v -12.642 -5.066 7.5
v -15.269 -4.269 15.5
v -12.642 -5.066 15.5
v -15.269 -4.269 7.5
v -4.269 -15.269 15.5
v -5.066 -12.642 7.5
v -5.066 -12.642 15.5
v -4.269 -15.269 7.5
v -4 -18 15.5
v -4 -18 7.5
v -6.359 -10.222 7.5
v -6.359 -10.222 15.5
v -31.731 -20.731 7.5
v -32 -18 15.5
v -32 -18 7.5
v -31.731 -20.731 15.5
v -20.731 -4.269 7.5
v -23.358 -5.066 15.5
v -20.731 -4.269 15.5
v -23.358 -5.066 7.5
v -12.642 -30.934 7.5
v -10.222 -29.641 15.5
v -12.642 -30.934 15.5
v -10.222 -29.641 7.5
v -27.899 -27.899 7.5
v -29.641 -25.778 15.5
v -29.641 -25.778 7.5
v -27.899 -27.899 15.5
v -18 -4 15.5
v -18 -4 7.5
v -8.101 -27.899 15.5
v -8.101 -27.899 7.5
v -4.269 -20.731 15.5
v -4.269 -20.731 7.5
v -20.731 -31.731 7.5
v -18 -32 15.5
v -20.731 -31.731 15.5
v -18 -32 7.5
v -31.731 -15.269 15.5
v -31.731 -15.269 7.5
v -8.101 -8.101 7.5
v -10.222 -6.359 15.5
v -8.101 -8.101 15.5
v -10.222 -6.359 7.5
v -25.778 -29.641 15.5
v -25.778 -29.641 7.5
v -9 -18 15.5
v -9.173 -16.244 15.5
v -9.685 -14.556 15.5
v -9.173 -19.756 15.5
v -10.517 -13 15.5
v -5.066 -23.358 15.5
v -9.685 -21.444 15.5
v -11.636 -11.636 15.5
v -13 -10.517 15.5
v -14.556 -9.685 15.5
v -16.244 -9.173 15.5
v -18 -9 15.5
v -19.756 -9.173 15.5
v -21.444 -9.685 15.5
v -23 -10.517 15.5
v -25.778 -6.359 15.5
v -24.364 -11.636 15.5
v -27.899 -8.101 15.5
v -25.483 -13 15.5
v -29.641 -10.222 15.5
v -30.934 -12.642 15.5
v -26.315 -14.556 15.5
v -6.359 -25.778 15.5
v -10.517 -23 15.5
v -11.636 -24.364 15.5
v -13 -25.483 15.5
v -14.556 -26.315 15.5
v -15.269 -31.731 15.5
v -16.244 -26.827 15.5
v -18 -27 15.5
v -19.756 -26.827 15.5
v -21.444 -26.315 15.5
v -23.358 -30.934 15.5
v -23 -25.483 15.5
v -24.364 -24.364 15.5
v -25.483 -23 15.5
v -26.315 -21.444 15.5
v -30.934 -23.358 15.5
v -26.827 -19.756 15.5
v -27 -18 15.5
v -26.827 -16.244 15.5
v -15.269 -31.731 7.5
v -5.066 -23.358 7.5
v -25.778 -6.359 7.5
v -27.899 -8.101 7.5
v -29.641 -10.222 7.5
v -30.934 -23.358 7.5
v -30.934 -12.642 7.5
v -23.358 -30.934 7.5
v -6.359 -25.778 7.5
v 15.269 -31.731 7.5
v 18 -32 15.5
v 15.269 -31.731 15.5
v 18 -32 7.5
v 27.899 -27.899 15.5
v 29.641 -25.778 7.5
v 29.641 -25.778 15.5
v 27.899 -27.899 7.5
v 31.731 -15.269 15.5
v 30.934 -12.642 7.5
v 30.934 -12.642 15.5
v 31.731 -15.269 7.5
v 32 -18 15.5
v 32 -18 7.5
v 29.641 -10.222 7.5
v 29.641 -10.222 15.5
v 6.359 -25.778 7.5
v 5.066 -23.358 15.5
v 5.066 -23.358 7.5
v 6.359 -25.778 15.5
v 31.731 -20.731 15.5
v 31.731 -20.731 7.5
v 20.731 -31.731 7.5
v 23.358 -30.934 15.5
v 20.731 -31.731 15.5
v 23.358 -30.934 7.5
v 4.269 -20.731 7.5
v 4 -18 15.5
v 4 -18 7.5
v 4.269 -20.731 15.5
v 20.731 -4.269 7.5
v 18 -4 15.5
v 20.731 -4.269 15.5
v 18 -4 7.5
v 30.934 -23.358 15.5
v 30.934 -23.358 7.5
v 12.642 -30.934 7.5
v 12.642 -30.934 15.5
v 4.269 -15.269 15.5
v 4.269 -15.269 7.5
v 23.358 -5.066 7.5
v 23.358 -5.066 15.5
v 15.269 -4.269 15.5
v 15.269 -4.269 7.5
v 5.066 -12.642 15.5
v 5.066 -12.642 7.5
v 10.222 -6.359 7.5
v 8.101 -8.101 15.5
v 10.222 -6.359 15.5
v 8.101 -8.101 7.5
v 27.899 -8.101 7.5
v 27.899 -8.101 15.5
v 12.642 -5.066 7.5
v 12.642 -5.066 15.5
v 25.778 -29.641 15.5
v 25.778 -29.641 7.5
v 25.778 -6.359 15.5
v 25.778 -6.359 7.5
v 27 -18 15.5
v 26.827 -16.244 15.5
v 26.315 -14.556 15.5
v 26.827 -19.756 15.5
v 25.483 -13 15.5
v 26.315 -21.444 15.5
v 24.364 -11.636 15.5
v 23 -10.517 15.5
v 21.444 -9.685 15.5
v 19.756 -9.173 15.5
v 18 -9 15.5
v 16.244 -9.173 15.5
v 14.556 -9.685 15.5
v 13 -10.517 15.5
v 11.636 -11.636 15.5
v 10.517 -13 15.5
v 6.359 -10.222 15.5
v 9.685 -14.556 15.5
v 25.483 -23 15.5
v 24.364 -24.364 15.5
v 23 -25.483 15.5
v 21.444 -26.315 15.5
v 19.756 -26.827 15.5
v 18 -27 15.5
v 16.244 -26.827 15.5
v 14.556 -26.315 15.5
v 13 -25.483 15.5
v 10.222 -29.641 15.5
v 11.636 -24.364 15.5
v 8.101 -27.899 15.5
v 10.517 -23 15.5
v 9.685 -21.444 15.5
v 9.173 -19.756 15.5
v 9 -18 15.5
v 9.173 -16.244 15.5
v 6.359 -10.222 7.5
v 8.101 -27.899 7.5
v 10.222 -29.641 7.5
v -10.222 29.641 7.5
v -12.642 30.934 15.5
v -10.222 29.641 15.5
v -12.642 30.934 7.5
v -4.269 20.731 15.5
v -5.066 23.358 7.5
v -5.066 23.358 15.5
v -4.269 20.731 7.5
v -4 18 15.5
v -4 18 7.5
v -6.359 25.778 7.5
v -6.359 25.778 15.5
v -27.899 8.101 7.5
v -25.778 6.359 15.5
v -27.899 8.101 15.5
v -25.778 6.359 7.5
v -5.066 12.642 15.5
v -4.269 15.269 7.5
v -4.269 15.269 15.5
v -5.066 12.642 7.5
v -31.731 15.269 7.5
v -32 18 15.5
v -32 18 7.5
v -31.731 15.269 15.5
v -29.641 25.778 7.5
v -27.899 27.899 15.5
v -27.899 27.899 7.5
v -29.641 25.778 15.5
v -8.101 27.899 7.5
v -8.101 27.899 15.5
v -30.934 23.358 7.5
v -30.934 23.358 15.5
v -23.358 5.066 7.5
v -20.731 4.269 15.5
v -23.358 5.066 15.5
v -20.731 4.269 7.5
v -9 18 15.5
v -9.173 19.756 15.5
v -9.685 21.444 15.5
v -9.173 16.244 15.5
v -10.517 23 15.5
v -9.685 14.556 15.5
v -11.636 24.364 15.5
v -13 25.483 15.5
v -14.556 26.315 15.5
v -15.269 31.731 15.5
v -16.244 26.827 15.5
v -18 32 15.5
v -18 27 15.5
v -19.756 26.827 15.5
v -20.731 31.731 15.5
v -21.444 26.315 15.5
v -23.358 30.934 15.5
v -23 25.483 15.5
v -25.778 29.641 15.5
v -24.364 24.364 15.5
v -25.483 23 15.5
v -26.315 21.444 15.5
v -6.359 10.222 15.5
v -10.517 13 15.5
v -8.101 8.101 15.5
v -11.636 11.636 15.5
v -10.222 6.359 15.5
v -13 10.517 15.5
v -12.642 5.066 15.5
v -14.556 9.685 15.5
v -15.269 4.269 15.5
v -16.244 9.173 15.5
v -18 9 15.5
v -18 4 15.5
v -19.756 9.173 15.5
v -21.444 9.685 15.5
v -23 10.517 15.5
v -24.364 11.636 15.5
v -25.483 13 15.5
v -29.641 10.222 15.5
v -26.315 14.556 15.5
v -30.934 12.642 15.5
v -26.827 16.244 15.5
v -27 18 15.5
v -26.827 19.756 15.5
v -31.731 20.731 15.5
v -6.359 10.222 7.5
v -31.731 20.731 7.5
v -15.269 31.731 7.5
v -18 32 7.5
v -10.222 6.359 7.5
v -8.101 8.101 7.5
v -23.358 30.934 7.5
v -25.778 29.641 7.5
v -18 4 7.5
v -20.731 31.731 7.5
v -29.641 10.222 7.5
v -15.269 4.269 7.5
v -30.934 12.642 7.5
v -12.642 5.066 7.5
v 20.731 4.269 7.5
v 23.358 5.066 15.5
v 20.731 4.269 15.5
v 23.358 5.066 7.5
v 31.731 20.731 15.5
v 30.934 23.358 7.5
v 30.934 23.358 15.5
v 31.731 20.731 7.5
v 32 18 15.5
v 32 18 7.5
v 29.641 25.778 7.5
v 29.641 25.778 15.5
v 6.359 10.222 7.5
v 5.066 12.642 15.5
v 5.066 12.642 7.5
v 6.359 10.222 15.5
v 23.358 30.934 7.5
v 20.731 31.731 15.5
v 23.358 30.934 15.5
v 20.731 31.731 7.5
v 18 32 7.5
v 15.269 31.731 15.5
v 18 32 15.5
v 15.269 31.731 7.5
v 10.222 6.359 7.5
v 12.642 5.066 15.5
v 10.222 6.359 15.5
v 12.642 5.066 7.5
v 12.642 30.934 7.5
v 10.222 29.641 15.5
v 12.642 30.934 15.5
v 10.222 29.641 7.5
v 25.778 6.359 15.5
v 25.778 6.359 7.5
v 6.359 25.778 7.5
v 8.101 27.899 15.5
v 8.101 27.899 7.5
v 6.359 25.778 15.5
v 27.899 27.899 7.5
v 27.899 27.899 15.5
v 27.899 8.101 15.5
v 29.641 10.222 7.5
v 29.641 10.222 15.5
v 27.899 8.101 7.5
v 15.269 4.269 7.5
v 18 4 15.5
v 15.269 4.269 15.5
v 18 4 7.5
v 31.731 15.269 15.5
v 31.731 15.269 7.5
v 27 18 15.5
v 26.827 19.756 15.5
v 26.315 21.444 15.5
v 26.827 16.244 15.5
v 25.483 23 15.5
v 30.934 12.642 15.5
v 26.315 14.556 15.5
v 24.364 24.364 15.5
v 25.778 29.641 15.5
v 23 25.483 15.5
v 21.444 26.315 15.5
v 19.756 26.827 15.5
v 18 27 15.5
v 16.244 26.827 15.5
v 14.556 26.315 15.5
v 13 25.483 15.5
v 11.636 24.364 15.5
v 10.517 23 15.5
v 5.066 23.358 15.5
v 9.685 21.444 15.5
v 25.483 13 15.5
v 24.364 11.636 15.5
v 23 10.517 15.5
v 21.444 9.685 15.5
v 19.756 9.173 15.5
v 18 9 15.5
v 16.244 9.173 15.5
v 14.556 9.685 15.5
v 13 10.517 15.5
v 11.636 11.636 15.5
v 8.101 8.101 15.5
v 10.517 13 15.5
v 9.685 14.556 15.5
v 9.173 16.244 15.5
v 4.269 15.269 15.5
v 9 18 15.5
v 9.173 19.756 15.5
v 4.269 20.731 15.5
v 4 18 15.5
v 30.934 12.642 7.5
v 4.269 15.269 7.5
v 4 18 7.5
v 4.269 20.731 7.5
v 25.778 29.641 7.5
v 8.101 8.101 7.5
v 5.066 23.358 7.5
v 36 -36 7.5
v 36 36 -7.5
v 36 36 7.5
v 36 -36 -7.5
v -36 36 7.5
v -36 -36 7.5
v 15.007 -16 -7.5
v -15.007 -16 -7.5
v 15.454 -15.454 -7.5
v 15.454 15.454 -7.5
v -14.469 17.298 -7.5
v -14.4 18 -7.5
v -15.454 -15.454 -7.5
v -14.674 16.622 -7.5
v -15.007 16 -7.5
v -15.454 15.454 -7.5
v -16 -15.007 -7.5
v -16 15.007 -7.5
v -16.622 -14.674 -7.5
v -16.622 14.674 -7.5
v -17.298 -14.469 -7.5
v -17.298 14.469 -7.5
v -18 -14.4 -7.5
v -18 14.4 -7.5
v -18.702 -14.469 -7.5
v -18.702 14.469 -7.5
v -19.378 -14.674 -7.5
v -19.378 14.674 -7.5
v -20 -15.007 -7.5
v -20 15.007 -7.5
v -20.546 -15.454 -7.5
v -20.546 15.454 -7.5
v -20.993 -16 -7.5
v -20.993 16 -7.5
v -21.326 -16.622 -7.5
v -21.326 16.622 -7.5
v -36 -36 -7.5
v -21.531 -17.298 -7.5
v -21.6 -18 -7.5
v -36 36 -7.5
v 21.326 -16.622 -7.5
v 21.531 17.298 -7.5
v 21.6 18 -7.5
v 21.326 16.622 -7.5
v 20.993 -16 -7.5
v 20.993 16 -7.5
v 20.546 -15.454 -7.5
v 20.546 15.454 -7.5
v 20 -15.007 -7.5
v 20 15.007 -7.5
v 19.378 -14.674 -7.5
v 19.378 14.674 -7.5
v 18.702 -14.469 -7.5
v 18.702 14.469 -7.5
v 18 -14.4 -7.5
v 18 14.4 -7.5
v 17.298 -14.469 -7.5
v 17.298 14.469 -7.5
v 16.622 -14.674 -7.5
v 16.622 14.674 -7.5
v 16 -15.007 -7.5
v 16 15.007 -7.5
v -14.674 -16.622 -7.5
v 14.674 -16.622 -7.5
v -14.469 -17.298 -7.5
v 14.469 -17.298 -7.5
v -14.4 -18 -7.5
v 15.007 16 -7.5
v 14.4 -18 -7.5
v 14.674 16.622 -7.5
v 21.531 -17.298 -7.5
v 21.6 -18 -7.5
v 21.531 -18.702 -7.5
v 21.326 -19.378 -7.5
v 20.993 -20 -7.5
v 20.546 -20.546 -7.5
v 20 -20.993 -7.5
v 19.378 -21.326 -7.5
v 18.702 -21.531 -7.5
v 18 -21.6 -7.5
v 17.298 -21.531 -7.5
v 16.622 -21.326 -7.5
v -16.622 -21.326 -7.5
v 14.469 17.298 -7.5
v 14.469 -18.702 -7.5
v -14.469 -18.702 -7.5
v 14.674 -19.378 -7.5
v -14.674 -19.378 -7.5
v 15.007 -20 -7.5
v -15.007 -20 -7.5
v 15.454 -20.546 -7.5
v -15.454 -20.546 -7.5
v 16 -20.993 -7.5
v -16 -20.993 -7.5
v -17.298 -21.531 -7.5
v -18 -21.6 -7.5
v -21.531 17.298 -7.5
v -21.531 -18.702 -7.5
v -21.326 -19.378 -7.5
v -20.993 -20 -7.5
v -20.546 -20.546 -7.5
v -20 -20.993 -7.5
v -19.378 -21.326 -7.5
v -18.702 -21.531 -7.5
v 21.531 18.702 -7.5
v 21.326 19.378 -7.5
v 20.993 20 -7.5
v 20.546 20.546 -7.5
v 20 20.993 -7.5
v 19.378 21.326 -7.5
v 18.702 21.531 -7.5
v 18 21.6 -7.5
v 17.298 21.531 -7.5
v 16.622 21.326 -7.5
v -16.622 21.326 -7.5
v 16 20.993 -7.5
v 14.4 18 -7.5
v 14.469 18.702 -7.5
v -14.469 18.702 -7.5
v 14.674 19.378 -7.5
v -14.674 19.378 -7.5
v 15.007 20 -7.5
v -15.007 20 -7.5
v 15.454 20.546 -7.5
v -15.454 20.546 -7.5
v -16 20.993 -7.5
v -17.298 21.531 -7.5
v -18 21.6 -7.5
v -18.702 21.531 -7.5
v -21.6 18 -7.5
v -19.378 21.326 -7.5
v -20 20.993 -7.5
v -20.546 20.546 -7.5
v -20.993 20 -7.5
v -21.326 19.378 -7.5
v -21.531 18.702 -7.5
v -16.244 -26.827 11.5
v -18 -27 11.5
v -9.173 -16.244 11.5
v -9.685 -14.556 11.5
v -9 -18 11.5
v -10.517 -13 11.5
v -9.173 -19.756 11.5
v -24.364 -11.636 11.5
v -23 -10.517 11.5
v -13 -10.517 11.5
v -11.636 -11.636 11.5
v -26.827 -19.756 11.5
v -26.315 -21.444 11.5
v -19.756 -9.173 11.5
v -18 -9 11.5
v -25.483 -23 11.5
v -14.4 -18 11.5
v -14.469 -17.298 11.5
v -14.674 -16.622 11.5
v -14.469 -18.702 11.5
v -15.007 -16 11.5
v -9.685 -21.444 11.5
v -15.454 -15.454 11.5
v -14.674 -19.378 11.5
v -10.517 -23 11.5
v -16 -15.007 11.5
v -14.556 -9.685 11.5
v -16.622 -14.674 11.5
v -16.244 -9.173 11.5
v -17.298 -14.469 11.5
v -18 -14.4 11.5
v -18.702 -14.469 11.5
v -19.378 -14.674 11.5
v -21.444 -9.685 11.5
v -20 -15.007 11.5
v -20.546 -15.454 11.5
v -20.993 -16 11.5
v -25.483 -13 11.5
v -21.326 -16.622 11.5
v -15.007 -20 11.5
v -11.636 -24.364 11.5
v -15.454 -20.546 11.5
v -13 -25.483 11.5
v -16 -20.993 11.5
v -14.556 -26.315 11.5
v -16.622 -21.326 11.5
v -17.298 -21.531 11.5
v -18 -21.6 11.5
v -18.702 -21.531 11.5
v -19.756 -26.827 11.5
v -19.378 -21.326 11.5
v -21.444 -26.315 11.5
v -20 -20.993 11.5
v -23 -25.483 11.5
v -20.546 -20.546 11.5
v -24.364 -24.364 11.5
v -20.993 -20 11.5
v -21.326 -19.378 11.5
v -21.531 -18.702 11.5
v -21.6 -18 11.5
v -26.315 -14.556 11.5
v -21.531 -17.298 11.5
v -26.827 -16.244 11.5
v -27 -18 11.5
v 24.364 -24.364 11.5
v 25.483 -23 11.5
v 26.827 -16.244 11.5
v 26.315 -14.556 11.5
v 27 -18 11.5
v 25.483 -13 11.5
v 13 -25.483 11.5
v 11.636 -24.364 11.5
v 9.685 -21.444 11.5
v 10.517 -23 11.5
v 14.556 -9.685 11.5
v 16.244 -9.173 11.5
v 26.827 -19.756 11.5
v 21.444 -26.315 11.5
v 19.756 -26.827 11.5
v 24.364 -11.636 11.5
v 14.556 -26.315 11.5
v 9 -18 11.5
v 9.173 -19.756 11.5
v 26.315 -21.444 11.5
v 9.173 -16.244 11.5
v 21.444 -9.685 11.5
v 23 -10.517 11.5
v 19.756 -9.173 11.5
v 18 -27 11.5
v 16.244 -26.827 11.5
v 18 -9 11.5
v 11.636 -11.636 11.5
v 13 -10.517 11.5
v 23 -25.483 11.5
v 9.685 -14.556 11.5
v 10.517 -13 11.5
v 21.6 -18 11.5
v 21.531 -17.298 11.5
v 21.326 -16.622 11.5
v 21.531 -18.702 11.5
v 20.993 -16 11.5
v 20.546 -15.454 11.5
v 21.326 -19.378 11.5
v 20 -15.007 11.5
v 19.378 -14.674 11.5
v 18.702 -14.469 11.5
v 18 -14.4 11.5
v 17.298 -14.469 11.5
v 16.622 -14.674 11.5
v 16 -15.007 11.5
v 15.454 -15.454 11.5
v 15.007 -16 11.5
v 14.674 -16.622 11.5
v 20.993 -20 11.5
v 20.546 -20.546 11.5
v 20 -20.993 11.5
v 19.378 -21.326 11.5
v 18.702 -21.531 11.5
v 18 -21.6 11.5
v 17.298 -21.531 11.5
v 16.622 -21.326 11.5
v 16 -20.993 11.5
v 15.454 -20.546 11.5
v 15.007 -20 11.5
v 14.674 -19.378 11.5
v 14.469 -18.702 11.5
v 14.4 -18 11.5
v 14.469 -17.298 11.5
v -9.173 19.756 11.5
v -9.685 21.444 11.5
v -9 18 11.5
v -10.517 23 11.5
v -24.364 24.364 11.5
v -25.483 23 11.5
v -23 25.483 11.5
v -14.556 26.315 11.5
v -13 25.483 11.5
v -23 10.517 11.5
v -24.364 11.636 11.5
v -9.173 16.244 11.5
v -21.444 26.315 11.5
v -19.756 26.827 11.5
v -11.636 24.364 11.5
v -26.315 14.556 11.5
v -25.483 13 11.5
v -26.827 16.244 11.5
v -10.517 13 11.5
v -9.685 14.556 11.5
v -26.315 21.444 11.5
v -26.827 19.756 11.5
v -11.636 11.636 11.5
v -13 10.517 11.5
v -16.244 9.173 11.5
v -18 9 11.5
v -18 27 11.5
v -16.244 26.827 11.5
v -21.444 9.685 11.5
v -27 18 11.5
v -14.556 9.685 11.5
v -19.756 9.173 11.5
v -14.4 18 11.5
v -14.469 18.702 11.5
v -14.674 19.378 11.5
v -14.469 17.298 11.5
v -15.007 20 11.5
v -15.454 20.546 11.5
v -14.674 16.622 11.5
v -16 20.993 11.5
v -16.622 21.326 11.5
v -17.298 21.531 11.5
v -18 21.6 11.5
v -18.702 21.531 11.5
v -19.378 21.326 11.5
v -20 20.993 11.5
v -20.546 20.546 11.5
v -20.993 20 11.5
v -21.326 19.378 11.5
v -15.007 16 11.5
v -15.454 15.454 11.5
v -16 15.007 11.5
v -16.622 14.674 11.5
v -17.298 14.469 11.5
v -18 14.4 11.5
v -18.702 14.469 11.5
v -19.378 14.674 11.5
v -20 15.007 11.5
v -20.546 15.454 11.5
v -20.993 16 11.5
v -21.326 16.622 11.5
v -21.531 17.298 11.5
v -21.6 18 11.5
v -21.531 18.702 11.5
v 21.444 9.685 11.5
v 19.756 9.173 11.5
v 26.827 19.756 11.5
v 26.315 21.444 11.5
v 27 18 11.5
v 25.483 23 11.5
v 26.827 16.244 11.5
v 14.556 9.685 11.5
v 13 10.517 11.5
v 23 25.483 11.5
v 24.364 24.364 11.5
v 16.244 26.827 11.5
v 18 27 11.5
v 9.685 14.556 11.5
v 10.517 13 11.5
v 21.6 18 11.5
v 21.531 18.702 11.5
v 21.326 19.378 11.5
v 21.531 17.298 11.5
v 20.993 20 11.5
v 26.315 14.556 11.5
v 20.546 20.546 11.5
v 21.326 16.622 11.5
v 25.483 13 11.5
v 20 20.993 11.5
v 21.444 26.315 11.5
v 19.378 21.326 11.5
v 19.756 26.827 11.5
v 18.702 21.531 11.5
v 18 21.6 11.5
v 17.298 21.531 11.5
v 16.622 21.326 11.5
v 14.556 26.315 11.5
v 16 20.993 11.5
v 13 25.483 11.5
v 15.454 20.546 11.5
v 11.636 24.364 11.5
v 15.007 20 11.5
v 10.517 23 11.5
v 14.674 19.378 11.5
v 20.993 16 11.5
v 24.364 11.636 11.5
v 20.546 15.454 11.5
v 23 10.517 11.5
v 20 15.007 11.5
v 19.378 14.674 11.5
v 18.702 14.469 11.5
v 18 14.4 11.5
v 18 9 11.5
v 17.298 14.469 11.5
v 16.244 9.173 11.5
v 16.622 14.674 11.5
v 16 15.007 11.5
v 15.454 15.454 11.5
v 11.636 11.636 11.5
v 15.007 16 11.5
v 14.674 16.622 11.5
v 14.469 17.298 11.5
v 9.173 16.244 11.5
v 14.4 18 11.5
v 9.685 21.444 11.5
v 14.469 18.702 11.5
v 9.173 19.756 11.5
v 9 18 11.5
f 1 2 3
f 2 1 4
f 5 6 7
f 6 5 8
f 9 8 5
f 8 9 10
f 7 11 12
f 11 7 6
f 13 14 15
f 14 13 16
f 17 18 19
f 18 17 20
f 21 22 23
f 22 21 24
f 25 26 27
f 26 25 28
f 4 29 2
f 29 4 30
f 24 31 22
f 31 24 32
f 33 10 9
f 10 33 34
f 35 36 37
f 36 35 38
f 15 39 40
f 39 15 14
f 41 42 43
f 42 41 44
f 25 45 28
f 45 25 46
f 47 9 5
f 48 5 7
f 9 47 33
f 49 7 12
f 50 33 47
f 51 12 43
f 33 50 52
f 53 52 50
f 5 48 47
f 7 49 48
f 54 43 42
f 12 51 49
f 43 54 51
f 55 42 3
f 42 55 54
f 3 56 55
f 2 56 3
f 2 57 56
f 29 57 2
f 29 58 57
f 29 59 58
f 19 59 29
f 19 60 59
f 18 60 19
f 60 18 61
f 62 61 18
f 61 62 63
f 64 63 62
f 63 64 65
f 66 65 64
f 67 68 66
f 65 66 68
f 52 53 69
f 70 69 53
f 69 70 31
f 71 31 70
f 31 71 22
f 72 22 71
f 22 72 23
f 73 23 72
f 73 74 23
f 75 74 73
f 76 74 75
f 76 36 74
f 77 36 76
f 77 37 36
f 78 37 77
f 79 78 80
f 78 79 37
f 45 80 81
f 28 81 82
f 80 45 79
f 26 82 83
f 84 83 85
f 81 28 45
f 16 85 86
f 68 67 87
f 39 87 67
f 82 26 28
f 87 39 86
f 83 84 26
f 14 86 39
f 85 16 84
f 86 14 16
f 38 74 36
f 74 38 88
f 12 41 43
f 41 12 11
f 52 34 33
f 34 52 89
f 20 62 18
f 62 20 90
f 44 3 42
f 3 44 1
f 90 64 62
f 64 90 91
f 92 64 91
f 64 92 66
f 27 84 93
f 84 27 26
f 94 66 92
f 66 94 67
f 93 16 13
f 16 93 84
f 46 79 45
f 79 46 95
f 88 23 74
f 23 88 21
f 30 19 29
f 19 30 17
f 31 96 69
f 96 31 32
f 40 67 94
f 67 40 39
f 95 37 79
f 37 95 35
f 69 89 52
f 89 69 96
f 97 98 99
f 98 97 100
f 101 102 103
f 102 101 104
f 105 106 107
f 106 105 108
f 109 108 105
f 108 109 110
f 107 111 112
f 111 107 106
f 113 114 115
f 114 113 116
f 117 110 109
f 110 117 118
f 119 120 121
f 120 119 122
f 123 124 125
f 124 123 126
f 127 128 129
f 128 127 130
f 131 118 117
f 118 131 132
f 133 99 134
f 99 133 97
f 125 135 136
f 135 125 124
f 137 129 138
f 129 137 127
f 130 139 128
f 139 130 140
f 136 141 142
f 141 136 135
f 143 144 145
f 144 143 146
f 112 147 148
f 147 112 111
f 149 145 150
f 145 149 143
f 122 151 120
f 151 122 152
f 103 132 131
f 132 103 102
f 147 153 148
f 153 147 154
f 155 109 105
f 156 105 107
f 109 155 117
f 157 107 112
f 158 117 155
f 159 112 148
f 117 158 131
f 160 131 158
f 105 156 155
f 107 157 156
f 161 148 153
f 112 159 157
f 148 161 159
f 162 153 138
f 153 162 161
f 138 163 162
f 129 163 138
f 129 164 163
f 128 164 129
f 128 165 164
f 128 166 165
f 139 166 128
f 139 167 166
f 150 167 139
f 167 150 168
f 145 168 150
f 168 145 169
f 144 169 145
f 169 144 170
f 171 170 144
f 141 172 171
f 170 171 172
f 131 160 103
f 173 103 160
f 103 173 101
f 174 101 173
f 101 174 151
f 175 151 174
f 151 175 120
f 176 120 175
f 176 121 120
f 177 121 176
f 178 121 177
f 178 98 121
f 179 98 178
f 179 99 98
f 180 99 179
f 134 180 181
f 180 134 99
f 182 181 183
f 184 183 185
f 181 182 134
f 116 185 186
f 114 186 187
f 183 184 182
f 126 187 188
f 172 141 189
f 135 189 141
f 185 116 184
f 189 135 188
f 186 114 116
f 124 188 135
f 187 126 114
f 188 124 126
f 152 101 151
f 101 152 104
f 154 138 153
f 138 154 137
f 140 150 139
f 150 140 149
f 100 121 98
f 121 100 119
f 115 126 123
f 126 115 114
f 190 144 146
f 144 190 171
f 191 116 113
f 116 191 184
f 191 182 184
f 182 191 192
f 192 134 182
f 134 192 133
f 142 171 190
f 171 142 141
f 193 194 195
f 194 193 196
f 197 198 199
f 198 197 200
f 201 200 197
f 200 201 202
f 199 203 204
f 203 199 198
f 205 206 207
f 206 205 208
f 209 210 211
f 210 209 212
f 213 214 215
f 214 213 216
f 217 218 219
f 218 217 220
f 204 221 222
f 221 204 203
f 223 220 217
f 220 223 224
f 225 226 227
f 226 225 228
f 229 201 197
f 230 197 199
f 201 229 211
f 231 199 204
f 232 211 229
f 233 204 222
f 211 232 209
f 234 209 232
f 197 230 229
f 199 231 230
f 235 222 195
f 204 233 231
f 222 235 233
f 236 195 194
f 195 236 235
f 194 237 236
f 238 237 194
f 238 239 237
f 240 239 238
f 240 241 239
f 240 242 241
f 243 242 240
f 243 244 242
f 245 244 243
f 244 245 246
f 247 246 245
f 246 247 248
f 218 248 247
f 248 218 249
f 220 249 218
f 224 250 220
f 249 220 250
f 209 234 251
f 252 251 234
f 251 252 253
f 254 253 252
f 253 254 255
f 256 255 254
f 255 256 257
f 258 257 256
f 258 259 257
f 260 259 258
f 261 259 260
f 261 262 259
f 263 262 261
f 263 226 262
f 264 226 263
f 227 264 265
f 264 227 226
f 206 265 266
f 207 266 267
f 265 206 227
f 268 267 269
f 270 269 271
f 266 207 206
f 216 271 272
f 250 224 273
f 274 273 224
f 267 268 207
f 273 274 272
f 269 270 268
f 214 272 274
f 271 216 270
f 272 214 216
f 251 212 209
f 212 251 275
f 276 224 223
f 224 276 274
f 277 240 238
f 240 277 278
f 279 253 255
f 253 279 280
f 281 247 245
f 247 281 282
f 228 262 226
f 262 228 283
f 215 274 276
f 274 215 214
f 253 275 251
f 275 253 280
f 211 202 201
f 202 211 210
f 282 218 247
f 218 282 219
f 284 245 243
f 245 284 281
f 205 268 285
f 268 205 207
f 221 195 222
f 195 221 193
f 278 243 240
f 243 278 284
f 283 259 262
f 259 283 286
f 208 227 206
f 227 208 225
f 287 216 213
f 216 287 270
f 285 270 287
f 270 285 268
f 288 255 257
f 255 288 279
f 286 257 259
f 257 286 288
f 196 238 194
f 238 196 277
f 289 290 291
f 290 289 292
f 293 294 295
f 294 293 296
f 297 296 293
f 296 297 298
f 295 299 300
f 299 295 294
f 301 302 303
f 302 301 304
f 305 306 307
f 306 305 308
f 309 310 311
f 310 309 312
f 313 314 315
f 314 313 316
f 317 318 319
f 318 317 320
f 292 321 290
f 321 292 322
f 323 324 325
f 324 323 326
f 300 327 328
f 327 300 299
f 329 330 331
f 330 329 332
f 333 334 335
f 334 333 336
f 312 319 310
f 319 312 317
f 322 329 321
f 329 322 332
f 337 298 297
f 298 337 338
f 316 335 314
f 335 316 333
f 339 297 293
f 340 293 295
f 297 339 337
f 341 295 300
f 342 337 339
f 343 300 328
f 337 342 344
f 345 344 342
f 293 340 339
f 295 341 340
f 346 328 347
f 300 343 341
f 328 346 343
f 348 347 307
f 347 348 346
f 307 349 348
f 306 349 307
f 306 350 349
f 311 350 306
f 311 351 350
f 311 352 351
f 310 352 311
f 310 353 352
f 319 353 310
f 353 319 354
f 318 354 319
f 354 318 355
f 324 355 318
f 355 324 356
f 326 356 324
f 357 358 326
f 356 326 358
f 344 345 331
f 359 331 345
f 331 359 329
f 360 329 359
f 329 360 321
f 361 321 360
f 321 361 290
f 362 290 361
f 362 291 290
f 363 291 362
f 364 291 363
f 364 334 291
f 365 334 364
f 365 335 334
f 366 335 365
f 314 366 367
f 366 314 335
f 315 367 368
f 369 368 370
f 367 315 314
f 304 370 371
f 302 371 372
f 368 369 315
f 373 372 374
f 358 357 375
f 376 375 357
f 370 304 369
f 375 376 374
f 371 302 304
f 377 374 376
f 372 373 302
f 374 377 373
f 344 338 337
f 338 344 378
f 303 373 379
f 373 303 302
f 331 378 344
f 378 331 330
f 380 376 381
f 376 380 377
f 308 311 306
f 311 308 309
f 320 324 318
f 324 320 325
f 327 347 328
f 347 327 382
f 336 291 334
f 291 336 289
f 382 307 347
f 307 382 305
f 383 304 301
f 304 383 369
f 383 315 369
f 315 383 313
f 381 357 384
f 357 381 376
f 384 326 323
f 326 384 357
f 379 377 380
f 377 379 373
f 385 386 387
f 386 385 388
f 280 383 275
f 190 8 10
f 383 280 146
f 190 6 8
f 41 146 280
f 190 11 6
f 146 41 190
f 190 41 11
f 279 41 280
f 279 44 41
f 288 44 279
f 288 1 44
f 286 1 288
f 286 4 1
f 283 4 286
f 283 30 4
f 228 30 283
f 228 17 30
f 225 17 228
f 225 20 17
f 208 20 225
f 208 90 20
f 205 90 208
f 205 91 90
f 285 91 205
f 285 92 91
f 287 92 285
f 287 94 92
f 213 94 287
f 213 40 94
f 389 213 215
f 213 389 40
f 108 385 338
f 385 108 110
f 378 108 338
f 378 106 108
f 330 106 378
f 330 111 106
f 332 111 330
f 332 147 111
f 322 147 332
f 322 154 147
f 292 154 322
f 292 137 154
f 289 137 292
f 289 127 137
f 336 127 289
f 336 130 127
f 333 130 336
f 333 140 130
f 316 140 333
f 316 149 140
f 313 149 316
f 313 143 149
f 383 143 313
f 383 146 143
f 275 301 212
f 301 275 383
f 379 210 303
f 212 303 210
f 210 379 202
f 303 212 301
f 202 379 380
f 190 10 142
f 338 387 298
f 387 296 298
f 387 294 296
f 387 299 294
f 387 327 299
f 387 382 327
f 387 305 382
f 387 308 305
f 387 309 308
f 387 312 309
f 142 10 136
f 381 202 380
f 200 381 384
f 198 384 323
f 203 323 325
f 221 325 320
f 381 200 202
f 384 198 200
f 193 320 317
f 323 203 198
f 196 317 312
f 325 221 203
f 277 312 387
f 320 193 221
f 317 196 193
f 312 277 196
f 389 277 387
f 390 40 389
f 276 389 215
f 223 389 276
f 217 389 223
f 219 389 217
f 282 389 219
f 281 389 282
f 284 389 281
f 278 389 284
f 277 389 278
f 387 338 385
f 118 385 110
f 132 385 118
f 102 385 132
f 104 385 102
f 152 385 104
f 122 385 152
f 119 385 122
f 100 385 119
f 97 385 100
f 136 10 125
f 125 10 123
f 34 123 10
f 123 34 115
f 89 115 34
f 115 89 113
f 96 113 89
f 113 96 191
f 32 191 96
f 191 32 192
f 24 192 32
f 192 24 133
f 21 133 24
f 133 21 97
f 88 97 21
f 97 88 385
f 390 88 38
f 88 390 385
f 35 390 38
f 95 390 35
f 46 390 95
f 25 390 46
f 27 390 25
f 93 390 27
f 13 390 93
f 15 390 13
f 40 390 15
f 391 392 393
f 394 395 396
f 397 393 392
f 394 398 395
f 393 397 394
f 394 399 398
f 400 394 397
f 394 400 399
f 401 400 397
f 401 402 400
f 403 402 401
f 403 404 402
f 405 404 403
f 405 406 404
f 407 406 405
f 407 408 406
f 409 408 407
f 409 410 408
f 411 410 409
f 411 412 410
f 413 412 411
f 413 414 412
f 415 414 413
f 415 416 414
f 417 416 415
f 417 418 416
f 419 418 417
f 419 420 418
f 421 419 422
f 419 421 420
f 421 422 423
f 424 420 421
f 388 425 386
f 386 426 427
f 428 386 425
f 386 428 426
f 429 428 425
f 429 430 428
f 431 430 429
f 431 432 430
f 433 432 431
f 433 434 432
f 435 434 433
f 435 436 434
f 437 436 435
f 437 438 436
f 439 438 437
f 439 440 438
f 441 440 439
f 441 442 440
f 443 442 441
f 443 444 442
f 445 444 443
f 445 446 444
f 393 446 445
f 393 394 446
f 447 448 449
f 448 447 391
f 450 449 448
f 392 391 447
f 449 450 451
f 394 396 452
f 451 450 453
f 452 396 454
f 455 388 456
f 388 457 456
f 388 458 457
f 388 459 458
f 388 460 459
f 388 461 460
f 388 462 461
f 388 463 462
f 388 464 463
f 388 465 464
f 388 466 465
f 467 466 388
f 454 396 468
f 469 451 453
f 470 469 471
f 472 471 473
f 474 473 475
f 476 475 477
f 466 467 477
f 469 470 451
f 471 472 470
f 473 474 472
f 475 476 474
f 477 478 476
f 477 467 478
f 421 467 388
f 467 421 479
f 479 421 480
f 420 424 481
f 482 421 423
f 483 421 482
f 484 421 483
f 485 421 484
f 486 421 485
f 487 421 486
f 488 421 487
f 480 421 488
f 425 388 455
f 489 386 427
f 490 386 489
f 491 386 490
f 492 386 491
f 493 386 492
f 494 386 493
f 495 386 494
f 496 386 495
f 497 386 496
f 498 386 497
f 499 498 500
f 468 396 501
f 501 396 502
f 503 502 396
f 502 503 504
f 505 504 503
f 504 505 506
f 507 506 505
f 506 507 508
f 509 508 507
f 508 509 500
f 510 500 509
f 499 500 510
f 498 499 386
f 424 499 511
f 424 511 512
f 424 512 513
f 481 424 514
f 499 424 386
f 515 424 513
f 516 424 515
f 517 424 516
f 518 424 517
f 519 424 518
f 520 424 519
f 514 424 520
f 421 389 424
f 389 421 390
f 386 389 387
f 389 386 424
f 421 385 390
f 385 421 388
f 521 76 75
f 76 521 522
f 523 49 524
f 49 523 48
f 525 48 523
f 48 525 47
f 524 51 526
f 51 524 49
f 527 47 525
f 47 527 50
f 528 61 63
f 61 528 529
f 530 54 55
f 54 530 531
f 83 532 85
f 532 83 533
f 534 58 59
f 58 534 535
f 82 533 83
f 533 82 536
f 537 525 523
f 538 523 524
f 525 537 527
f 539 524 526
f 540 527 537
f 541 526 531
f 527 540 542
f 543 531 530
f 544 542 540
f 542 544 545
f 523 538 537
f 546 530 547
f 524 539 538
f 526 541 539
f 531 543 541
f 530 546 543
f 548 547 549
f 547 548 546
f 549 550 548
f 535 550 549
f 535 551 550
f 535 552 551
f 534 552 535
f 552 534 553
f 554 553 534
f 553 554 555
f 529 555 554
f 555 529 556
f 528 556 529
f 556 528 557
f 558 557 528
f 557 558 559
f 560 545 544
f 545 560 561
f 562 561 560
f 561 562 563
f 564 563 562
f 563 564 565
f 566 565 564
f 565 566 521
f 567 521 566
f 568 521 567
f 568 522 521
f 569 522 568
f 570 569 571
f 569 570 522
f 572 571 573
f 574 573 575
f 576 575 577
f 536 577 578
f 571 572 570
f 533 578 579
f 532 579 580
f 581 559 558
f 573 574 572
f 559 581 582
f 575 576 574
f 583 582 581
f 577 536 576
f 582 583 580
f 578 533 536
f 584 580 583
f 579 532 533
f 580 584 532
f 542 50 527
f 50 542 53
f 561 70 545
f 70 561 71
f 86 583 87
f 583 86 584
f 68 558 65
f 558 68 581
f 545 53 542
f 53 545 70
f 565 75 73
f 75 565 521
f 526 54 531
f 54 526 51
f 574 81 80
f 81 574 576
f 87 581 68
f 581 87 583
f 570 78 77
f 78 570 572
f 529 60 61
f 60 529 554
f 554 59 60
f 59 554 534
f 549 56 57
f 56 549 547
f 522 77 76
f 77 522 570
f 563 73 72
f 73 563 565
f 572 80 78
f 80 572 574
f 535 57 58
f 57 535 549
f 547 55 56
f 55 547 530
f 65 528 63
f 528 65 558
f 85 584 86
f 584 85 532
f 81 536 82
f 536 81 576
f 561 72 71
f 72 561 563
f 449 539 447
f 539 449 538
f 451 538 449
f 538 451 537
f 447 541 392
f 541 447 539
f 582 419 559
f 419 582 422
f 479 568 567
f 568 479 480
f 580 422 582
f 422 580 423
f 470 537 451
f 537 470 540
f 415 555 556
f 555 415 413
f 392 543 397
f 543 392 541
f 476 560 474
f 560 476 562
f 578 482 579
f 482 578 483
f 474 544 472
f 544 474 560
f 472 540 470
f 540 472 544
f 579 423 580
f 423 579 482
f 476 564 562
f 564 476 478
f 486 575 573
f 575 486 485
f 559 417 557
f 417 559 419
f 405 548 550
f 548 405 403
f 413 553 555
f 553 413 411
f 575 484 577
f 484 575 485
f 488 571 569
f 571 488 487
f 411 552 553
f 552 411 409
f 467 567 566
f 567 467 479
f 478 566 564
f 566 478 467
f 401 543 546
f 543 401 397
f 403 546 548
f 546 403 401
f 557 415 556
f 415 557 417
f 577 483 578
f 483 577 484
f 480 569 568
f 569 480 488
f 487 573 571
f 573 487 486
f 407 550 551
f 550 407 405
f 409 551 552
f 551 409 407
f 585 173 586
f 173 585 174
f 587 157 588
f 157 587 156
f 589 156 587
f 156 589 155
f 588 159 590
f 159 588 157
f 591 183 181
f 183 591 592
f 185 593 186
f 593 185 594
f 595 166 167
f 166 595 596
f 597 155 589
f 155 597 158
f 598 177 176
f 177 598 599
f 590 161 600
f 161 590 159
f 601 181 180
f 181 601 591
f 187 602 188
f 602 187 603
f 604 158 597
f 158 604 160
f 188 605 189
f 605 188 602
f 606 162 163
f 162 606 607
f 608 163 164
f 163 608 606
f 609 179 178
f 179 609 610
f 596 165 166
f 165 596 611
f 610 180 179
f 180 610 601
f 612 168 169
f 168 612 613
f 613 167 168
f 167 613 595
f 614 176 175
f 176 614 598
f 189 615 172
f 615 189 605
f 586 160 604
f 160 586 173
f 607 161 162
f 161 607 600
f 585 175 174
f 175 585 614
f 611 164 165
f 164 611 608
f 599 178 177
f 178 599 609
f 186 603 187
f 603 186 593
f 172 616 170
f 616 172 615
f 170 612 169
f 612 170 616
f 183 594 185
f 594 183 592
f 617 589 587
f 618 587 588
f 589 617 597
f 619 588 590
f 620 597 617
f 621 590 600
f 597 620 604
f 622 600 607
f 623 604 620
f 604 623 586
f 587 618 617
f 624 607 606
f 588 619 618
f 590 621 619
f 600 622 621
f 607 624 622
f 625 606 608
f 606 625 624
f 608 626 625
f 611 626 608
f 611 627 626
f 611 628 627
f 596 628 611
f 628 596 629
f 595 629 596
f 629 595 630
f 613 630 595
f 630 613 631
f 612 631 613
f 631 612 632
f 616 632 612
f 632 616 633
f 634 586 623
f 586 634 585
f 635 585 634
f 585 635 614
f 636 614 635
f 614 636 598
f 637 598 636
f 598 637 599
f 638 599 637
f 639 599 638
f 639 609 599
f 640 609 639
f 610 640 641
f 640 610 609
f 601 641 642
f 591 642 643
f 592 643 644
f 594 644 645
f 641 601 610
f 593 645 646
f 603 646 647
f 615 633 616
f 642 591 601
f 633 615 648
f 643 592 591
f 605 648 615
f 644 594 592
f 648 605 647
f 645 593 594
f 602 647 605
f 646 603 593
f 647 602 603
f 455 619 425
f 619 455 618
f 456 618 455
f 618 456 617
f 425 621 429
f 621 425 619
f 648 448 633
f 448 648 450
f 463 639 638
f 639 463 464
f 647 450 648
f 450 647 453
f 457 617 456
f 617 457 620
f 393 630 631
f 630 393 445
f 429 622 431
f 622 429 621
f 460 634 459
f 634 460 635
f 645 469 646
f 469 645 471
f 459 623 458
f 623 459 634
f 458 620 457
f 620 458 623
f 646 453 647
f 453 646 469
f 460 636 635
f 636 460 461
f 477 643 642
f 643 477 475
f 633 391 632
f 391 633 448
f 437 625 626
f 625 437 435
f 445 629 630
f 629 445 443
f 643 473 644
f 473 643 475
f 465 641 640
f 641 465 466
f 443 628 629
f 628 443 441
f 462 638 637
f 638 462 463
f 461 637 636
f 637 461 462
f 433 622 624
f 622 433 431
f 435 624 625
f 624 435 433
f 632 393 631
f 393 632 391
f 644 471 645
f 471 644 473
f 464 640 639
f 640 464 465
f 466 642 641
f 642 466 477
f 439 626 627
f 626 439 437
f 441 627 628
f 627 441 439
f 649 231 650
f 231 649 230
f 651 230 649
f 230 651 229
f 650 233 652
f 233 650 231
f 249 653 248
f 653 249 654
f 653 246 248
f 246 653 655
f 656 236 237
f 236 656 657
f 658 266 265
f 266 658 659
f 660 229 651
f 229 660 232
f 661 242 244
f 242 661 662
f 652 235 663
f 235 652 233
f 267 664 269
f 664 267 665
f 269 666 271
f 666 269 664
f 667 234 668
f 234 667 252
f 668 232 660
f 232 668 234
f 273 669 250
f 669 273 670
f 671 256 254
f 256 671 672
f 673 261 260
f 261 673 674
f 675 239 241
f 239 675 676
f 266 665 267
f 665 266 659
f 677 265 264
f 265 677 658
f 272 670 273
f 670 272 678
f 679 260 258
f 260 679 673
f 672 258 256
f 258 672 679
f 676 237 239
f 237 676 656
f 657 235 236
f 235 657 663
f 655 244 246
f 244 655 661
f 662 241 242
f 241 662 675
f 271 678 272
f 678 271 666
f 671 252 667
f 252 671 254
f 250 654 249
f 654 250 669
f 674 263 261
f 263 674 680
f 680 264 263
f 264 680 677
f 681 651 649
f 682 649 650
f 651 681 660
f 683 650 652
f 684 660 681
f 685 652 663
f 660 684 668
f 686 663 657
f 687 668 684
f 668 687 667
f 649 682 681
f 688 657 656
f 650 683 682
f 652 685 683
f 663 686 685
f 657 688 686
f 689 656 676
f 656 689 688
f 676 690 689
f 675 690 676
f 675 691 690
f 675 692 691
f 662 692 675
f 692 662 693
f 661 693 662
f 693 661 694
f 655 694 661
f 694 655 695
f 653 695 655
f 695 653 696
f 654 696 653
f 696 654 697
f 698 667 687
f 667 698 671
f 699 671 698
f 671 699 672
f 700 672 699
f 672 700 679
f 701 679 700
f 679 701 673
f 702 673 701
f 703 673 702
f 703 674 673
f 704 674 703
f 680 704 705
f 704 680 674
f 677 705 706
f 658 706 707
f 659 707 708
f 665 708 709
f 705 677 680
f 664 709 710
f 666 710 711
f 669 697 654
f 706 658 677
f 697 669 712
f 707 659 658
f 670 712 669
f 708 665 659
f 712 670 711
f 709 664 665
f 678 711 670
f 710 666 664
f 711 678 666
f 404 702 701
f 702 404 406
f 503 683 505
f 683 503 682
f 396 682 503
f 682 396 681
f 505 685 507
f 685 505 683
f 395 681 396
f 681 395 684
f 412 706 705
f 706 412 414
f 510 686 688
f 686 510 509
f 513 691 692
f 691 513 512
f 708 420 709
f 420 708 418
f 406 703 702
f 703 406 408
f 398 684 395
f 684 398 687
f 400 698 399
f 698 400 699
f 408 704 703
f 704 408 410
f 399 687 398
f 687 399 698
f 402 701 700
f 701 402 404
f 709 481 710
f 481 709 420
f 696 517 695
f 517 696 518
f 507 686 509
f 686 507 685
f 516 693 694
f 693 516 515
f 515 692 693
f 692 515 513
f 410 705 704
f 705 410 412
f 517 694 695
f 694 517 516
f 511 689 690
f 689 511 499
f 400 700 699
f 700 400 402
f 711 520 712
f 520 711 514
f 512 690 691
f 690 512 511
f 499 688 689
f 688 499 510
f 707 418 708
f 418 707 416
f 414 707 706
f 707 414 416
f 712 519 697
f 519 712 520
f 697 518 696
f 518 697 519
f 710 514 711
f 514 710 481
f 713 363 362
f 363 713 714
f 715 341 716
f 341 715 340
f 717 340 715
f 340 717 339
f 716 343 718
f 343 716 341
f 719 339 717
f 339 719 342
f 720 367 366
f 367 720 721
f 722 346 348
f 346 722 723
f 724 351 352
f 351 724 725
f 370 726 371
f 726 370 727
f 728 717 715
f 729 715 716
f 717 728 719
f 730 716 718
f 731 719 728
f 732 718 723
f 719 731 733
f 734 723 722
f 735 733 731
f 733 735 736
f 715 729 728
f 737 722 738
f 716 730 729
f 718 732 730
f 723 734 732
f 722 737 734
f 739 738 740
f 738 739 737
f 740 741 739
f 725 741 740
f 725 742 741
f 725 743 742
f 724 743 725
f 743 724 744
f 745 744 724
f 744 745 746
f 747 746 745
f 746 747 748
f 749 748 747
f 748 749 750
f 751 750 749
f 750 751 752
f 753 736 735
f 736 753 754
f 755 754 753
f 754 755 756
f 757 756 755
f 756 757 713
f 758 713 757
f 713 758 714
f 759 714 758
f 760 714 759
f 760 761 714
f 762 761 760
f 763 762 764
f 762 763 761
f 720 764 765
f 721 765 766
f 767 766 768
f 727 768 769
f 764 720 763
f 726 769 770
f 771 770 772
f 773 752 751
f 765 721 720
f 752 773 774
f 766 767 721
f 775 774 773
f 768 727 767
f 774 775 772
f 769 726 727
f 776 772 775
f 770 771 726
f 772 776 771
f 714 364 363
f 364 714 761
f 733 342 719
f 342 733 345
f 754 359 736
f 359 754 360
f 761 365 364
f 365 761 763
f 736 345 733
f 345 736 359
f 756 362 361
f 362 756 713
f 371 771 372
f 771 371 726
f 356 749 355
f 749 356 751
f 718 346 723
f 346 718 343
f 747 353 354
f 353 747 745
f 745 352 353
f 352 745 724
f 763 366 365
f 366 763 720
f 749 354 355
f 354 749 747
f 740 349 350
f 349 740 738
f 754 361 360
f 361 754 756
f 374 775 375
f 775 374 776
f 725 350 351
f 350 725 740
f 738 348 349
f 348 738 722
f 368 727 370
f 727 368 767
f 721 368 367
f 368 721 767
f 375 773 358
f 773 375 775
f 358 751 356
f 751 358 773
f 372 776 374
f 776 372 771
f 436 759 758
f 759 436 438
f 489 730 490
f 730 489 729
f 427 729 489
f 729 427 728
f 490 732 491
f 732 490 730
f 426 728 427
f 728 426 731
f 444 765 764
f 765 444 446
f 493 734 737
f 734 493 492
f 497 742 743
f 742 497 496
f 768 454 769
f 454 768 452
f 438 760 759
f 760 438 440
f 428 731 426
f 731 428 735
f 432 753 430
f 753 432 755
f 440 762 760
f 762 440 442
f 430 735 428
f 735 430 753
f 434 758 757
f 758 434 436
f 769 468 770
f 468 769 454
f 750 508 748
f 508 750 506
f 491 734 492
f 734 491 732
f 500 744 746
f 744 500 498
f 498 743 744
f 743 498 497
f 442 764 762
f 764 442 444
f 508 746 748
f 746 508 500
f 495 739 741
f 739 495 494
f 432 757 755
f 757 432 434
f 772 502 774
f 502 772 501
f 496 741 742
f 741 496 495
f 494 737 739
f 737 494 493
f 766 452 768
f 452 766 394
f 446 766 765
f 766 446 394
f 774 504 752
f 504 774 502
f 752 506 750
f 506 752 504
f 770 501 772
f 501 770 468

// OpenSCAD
$fn = 32;

// ----------------------------------------------------------------------
// Socket pad plate
// bosses with counterbored sockets for the screws
// ----------------------------------------------------------------------

// --- parameters (mm) ---
base_t = 15;       // base plate thickness
boss_h = 8;        // boss height above the base plate
boss_d = 28;       // boss diameter
socket_d = 18;     // socket diameter
socket_depth = 4;  // socket depth from the boss face
bolt_d = 7.2;      // screw clearance hole through the socket floor
rows = 2;          // boss rows
cols = 2;          // bosses per row
pitch = 36;        // boss pitch

// --- derived feature positions (mm) ---
height = base_t + boss_h;           // = 23   overall height of the part
plate = [pitch * (cols - 1) + boss_d + 8, pitch * (rows - 1) + boss_d + 8, base_t];  // = [72, 72, 15]   overall size (x, y, z)
span_x = pitch * (cols - 1);        // = 36   distance between outer bosses
span_y = pitch * (rows - 1);        // = 36   distance between boss rows
origin_x = -span_x / 2;             // = -18   X of the first boss
origin_y = -span_y / 2;             // = -18   Y of the first boss
feature_centers = [
  [origin_x + 0 * pitch, origin_y + 0 * pitch],
  [origin_x + 1 * pitch, origin_y + 0 * pitch],
  [origin_x + 0 * pitch, origin_y + 1 * pitch],
  [origin_x + 1 * pitch, origin_y + 1 * pitch]
];   // boss centres: sockets, holes and the pads themselves are placed from here

// base plate, bosses on feature_centers, socket + through hole in each
difference() {
  union() {
    cube(plate, center = true);
    for (centre = feature_centers)
      translate([centre[0], centre[1], plate[2] / 2 - 1])
        cylinder(d = boss_d, h = boss_h + 1);
  }
  for (centre = feature_centers) {
    translate([centre[0], centre[1], plate[2] / 2 + boss_h - socket_depth])
      cylinder(d = socket_d, h = socket_depth + 1);
    translate([centre[0], centre[1], -height])
      cylinder(d = bolt_d, h = 2 * height + 2);  // through the socket floor
  }
}
